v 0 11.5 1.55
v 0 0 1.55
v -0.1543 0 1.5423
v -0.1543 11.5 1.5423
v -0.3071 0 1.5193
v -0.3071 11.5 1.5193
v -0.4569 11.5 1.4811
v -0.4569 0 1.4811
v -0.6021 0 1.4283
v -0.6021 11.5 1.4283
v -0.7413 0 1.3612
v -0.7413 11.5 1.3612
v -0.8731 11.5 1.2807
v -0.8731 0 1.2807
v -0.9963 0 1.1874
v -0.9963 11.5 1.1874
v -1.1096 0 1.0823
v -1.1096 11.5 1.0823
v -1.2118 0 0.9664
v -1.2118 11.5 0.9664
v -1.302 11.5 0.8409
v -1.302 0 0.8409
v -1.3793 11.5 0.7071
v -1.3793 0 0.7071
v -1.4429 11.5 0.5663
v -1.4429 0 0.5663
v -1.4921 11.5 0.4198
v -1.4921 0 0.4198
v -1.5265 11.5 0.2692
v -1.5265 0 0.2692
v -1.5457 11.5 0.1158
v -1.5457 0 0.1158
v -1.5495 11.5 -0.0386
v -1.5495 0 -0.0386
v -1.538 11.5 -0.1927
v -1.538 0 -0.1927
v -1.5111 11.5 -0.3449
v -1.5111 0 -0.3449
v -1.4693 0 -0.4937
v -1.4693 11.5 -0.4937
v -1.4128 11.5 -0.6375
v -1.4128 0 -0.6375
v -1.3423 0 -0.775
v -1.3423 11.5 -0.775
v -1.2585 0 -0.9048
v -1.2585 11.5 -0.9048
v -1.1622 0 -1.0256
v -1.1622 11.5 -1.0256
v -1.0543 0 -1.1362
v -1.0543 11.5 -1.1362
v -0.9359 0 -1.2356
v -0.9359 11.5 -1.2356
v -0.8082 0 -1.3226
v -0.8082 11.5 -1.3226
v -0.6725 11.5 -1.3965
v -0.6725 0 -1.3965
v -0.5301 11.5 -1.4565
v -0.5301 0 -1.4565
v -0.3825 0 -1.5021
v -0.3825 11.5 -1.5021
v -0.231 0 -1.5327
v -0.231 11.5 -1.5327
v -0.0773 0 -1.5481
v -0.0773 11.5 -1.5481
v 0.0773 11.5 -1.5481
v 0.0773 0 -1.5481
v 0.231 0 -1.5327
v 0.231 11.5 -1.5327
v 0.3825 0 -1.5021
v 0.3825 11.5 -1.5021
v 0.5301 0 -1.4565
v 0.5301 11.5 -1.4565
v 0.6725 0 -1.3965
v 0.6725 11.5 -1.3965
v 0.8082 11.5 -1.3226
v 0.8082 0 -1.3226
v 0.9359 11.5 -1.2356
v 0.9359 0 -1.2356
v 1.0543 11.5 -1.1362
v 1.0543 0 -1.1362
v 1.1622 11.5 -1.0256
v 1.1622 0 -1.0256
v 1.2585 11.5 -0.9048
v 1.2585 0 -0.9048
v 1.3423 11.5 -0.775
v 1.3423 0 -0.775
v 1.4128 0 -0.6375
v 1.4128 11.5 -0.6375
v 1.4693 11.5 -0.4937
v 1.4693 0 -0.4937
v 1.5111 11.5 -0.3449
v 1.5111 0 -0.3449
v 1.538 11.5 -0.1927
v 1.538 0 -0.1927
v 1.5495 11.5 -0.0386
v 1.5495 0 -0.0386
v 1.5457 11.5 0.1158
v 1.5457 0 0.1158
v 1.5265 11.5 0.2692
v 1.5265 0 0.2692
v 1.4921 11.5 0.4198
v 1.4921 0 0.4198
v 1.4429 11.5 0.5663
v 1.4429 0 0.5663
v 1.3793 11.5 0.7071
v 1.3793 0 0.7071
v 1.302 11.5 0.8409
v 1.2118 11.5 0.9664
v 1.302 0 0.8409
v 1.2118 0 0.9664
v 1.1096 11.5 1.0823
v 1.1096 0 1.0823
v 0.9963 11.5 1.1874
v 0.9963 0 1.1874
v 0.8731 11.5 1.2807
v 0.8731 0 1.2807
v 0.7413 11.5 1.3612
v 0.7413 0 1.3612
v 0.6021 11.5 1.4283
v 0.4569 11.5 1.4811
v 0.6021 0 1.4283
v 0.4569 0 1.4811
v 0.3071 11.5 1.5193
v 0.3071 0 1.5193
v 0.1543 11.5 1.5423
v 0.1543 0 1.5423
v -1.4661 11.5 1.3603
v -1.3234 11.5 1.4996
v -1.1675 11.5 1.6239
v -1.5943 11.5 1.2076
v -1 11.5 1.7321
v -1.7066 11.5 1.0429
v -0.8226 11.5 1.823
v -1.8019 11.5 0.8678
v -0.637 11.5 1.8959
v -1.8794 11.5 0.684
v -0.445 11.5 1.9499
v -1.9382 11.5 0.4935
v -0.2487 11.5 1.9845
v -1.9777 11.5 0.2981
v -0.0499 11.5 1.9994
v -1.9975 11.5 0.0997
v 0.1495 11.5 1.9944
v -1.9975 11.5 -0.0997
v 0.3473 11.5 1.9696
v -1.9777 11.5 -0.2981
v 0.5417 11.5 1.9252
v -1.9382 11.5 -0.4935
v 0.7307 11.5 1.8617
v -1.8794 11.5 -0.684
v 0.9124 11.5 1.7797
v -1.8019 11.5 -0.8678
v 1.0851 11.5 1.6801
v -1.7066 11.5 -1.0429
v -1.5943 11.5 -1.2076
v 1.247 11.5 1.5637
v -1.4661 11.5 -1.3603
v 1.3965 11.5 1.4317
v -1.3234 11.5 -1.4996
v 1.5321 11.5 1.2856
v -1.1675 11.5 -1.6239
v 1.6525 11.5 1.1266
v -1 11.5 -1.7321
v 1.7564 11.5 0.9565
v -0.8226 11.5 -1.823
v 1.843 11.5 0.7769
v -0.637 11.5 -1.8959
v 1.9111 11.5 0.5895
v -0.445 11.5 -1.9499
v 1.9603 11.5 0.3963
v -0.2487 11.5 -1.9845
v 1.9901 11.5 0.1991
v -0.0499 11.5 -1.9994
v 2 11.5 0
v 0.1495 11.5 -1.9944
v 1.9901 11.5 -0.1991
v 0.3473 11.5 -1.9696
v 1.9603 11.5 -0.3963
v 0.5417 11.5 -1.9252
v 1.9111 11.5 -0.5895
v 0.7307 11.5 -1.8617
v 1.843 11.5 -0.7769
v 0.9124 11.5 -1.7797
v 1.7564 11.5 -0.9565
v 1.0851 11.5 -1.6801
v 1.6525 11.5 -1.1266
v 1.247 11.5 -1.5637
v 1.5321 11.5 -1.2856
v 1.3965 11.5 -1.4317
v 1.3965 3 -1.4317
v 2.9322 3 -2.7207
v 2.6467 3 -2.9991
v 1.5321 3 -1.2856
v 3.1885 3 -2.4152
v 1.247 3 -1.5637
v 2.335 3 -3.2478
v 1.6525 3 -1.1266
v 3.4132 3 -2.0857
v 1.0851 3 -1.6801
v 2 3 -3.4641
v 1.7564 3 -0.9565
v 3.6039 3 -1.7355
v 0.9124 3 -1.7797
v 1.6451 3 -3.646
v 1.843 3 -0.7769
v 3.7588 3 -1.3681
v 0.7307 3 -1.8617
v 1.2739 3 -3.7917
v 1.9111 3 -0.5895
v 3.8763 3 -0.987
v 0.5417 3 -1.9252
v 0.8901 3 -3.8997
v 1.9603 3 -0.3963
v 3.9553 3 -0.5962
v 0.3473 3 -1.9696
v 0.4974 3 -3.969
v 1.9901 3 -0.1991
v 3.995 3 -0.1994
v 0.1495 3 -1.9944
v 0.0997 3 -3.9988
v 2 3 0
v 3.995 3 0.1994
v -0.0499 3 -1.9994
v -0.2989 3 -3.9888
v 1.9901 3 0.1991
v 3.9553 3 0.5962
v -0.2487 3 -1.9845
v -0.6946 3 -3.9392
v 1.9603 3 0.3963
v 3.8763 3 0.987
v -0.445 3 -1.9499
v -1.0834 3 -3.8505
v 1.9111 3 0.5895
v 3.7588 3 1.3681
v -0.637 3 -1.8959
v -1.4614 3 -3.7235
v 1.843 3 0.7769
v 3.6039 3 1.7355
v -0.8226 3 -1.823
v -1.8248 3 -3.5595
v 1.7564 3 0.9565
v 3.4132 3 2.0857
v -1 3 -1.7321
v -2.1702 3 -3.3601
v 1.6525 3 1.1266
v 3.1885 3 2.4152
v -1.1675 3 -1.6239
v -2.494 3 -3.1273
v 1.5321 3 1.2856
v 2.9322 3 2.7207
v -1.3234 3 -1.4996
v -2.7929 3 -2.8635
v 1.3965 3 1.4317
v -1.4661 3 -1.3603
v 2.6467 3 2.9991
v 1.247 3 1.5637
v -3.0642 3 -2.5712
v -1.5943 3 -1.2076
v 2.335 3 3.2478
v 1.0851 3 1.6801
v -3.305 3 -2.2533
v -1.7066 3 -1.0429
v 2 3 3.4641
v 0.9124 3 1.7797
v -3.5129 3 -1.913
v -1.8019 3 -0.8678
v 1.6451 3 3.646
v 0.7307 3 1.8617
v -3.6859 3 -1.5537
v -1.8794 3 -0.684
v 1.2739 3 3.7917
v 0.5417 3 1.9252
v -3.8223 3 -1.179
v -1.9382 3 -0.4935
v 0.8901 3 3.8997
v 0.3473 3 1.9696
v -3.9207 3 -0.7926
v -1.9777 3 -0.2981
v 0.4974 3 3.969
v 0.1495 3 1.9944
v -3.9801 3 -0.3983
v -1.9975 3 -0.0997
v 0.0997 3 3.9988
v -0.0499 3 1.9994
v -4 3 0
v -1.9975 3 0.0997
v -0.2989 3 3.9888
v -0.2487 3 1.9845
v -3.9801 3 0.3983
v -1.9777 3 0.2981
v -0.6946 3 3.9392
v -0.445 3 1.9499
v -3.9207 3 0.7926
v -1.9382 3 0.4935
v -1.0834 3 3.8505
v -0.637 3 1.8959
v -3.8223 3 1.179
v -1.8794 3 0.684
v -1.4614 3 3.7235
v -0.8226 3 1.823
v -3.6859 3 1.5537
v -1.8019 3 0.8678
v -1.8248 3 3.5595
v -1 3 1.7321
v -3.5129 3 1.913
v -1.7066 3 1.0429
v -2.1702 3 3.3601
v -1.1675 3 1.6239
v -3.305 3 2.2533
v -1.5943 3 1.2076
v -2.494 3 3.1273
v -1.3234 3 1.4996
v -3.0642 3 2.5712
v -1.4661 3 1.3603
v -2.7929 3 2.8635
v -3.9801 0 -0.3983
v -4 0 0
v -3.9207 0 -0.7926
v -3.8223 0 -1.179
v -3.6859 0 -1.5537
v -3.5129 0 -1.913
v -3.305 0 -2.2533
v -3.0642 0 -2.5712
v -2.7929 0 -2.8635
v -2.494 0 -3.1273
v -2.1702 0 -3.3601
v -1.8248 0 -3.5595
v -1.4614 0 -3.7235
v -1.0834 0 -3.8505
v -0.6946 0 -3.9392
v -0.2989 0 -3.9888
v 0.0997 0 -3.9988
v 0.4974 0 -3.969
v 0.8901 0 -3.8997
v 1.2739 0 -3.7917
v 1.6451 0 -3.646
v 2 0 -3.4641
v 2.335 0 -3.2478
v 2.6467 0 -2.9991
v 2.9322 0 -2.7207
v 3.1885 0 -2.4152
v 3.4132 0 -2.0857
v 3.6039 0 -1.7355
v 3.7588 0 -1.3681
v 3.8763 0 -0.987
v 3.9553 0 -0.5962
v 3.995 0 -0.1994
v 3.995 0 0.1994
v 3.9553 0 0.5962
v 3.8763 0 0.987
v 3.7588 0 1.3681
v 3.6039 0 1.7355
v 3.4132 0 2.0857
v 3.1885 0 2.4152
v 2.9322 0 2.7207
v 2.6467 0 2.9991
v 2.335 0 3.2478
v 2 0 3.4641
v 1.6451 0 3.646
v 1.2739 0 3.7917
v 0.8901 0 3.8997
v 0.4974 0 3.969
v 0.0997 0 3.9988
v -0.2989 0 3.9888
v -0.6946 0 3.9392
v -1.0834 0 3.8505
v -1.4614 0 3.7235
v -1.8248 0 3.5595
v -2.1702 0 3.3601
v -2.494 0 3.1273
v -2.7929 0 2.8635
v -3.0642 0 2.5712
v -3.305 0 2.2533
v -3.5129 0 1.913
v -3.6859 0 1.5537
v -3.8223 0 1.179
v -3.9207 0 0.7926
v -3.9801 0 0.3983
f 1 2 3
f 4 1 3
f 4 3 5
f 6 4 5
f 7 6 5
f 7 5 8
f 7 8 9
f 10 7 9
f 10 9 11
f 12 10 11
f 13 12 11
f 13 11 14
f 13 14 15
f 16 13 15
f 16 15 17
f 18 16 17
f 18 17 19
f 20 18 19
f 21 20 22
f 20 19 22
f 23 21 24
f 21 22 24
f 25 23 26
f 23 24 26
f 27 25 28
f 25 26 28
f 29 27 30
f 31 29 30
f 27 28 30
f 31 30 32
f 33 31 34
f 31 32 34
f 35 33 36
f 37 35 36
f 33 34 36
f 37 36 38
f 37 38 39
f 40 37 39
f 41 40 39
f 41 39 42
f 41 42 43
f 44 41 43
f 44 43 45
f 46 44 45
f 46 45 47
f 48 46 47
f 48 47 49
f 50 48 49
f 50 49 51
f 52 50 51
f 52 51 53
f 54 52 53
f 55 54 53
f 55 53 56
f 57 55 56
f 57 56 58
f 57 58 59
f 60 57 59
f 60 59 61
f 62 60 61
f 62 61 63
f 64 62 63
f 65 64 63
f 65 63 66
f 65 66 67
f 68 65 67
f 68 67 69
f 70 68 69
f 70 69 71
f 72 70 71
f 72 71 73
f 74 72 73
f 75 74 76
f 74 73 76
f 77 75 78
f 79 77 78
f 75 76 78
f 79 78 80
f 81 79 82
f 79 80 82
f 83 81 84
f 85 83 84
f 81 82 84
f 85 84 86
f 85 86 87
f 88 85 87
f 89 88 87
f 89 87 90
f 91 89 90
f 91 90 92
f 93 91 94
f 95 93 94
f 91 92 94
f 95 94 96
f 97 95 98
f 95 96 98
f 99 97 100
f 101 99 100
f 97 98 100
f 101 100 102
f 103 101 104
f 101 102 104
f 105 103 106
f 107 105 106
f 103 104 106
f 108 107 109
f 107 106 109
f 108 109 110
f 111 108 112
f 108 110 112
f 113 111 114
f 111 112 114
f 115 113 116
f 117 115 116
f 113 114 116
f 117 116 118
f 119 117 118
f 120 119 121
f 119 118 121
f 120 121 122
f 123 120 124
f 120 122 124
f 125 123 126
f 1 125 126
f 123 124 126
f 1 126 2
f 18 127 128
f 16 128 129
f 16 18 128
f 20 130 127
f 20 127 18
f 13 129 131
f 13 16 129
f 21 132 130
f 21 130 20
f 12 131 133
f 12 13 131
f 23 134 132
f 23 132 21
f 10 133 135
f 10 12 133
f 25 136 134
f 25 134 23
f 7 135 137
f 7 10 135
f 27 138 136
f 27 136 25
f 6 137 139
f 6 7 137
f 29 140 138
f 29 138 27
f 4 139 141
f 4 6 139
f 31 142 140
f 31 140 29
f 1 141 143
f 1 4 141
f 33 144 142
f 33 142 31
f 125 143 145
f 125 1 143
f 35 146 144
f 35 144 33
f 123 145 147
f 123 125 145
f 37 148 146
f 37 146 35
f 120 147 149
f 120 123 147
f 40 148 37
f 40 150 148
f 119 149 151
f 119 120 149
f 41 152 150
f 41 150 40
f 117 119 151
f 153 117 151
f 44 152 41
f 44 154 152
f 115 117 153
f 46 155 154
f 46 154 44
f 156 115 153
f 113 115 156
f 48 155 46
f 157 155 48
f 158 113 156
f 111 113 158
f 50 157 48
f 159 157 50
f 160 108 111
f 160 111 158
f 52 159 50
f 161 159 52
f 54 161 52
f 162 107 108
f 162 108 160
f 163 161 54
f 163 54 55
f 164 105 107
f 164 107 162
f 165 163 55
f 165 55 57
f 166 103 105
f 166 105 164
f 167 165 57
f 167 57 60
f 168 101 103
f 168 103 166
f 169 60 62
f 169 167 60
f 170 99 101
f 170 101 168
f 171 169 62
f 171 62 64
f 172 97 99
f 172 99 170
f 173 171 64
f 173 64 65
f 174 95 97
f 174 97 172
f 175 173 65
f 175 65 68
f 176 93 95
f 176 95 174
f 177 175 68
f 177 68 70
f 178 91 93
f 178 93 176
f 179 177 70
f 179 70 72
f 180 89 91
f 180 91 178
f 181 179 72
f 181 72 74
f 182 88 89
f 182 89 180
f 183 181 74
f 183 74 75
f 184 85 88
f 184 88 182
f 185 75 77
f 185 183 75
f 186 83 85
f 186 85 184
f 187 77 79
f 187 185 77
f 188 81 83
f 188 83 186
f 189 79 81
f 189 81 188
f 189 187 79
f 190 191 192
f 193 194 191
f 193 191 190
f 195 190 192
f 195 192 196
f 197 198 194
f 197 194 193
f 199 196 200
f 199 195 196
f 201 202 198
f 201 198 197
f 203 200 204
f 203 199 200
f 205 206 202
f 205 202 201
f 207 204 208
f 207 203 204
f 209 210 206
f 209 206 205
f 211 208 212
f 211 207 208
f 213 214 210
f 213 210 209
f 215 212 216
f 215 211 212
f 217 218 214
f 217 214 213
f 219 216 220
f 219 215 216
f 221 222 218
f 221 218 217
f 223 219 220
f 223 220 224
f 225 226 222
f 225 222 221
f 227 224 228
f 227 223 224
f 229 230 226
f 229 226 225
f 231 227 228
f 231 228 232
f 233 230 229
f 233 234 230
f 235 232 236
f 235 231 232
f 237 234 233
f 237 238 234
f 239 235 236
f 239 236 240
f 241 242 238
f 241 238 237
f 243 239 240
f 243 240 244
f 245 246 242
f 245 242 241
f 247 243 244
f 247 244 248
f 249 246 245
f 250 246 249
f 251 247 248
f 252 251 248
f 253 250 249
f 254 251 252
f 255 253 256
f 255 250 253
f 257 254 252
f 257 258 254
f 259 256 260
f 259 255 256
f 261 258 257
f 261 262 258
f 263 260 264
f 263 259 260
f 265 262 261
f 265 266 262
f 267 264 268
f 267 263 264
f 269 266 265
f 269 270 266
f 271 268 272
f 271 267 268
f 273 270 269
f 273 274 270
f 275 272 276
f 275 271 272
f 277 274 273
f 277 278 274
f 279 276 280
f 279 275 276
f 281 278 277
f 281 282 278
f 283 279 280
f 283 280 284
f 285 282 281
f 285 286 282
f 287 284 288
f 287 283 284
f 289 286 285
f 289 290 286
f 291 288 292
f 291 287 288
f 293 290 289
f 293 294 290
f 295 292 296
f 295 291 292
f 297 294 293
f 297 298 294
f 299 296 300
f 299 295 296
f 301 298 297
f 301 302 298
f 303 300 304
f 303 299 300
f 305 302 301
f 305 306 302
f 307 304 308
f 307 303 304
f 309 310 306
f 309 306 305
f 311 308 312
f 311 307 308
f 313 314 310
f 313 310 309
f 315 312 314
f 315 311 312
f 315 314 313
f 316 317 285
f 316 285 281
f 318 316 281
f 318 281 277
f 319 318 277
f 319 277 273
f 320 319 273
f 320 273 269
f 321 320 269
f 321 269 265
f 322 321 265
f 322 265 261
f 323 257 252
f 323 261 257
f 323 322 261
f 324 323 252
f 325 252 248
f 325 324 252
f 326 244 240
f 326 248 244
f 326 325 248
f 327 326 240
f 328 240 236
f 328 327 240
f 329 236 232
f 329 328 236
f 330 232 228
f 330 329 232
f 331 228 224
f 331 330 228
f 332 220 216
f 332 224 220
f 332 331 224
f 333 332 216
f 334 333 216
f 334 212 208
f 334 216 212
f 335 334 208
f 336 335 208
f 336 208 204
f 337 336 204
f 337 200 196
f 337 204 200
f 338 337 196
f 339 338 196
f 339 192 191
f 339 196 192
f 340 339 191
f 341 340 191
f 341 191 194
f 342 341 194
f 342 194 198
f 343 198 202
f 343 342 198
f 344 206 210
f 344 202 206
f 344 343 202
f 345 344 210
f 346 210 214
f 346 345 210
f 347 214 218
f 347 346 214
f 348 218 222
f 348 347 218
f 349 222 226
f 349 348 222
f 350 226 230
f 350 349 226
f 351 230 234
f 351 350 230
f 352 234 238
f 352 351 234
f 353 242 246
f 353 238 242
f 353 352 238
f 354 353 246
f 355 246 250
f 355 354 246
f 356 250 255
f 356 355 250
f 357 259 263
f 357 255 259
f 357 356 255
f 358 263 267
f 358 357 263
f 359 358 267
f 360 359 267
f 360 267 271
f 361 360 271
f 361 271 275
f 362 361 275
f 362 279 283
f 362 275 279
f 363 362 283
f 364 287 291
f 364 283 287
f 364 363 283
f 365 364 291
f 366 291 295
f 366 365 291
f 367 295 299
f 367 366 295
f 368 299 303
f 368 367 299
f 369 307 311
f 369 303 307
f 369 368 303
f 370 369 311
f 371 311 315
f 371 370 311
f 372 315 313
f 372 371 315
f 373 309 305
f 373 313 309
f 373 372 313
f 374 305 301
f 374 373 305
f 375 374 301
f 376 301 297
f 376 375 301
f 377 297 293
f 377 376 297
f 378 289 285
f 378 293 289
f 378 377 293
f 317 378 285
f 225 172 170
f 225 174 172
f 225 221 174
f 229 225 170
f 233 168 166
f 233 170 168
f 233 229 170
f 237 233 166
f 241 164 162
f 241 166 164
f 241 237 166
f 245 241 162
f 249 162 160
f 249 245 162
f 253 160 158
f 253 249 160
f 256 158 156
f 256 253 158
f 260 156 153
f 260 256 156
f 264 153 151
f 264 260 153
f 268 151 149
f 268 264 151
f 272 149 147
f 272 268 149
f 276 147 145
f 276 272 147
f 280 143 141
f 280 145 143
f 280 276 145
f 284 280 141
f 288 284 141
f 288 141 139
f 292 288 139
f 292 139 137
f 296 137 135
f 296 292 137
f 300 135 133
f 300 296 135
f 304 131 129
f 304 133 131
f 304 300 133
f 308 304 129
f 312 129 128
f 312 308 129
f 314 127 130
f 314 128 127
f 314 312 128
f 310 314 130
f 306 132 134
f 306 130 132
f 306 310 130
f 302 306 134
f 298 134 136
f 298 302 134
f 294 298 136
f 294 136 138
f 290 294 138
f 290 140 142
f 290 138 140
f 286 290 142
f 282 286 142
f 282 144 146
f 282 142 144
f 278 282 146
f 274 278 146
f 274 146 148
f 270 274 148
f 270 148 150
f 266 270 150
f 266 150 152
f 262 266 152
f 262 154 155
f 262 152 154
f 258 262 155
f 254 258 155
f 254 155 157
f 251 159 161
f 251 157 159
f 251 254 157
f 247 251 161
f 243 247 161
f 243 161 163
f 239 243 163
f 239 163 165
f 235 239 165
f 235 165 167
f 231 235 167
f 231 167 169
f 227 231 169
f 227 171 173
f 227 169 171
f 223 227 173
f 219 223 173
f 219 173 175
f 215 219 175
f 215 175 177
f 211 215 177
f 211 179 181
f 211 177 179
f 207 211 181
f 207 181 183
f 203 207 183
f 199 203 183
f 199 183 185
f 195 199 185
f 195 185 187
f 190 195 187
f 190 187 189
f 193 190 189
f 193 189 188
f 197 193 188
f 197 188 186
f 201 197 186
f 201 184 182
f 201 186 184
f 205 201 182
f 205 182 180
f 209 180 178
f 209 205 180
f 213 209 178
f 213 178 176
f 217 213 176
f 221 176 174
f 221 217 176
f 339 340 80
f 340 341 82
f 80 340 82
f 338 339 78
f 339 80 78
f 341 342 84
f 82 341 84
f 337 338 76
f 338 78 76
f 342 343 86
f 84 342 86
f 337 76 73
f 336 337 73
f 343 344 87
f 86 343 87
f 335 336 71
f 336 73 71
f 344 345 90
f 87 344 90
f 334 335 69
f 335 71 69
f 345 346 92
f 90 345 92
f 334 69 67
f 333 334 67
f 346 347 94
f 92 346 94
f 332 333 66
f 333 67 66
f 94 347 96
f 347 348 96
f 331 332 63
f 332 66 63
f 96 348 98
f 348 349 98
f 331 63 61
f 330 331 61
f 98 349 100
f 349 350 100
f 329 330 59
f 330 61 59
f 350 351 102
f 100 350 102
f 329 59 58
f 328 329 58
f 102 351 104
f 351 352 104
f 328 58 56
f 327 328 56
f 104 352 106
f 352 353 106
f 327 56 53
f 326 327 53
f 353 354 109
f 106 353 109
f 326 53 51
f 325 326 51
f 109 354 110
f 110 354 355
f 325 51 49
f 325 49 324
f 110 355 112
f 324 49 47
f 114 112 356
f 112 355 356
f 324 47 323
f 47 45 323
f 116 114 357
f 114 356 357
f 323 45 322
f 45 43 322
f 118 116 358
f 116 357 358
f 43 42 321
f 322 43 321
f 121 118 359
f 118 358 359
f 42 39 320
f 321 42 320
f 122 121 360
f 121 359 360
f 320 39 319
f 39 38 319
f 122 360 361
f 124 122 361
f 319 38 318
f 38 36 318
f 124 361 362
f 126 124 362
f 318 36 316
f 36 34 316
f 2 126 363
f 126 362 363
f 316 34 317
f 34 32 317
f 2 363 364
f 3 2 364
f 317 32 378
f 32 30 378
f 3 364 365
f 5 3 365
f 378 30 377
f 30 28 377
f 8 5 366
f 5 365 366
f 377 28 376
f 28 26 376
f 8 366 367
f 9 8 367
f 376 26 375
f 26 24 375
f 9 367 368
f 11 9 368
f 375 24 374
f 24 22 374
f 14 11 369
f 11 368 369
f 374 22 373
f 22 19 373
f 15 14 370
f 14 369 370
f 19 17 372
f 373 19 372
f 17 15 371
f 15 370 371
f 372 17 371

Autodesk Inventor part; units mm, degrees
ref_plane "YZ Plane" through (0, 0, 0) normal (1, 0, 0) x (0, 1, 0)
ref_plane "XZ Plane" through (0, 0, 0) normal (0, 1, 0) x (-1, 0, 0)
ref_plane "XY Plane" through (0, 0, 0) normal (0, 0, 1) x (1, 0, 0)
sketch "Sketch1" plane through (0, 0, 0) normal (0, 1, 0) x (-1, 0, 0)
  circle A0 centre (0, 0) radius 4
  dimension "d0" = 8
extrude "Extrusion1" add sketch "Sketch1" along normal blind 3
sketch "Sketch2" plane through (0, 3, 0) normal (0, 1, 0) x (1, 0, 0)
  circle A0 centre (0, 0) radius 2
  dimension "d3" = 4
extrude "Extrusion2" add sketch "Sketch2" along normal blind 8.5
sketch "Sketch3" plane through (0, 11.5, 0) normal (0, 1, 0) x (1, 0, 0)
  point P0 (0, 0)
hole "Hole1" at (0, 11.5, 0) direction (0, -1, 0) diameter 3.1 end through all clearance for "Flat Head Machine Screw" size "M3" standard "Ansi Metric M Profile"
properties part number "Tensioner"
